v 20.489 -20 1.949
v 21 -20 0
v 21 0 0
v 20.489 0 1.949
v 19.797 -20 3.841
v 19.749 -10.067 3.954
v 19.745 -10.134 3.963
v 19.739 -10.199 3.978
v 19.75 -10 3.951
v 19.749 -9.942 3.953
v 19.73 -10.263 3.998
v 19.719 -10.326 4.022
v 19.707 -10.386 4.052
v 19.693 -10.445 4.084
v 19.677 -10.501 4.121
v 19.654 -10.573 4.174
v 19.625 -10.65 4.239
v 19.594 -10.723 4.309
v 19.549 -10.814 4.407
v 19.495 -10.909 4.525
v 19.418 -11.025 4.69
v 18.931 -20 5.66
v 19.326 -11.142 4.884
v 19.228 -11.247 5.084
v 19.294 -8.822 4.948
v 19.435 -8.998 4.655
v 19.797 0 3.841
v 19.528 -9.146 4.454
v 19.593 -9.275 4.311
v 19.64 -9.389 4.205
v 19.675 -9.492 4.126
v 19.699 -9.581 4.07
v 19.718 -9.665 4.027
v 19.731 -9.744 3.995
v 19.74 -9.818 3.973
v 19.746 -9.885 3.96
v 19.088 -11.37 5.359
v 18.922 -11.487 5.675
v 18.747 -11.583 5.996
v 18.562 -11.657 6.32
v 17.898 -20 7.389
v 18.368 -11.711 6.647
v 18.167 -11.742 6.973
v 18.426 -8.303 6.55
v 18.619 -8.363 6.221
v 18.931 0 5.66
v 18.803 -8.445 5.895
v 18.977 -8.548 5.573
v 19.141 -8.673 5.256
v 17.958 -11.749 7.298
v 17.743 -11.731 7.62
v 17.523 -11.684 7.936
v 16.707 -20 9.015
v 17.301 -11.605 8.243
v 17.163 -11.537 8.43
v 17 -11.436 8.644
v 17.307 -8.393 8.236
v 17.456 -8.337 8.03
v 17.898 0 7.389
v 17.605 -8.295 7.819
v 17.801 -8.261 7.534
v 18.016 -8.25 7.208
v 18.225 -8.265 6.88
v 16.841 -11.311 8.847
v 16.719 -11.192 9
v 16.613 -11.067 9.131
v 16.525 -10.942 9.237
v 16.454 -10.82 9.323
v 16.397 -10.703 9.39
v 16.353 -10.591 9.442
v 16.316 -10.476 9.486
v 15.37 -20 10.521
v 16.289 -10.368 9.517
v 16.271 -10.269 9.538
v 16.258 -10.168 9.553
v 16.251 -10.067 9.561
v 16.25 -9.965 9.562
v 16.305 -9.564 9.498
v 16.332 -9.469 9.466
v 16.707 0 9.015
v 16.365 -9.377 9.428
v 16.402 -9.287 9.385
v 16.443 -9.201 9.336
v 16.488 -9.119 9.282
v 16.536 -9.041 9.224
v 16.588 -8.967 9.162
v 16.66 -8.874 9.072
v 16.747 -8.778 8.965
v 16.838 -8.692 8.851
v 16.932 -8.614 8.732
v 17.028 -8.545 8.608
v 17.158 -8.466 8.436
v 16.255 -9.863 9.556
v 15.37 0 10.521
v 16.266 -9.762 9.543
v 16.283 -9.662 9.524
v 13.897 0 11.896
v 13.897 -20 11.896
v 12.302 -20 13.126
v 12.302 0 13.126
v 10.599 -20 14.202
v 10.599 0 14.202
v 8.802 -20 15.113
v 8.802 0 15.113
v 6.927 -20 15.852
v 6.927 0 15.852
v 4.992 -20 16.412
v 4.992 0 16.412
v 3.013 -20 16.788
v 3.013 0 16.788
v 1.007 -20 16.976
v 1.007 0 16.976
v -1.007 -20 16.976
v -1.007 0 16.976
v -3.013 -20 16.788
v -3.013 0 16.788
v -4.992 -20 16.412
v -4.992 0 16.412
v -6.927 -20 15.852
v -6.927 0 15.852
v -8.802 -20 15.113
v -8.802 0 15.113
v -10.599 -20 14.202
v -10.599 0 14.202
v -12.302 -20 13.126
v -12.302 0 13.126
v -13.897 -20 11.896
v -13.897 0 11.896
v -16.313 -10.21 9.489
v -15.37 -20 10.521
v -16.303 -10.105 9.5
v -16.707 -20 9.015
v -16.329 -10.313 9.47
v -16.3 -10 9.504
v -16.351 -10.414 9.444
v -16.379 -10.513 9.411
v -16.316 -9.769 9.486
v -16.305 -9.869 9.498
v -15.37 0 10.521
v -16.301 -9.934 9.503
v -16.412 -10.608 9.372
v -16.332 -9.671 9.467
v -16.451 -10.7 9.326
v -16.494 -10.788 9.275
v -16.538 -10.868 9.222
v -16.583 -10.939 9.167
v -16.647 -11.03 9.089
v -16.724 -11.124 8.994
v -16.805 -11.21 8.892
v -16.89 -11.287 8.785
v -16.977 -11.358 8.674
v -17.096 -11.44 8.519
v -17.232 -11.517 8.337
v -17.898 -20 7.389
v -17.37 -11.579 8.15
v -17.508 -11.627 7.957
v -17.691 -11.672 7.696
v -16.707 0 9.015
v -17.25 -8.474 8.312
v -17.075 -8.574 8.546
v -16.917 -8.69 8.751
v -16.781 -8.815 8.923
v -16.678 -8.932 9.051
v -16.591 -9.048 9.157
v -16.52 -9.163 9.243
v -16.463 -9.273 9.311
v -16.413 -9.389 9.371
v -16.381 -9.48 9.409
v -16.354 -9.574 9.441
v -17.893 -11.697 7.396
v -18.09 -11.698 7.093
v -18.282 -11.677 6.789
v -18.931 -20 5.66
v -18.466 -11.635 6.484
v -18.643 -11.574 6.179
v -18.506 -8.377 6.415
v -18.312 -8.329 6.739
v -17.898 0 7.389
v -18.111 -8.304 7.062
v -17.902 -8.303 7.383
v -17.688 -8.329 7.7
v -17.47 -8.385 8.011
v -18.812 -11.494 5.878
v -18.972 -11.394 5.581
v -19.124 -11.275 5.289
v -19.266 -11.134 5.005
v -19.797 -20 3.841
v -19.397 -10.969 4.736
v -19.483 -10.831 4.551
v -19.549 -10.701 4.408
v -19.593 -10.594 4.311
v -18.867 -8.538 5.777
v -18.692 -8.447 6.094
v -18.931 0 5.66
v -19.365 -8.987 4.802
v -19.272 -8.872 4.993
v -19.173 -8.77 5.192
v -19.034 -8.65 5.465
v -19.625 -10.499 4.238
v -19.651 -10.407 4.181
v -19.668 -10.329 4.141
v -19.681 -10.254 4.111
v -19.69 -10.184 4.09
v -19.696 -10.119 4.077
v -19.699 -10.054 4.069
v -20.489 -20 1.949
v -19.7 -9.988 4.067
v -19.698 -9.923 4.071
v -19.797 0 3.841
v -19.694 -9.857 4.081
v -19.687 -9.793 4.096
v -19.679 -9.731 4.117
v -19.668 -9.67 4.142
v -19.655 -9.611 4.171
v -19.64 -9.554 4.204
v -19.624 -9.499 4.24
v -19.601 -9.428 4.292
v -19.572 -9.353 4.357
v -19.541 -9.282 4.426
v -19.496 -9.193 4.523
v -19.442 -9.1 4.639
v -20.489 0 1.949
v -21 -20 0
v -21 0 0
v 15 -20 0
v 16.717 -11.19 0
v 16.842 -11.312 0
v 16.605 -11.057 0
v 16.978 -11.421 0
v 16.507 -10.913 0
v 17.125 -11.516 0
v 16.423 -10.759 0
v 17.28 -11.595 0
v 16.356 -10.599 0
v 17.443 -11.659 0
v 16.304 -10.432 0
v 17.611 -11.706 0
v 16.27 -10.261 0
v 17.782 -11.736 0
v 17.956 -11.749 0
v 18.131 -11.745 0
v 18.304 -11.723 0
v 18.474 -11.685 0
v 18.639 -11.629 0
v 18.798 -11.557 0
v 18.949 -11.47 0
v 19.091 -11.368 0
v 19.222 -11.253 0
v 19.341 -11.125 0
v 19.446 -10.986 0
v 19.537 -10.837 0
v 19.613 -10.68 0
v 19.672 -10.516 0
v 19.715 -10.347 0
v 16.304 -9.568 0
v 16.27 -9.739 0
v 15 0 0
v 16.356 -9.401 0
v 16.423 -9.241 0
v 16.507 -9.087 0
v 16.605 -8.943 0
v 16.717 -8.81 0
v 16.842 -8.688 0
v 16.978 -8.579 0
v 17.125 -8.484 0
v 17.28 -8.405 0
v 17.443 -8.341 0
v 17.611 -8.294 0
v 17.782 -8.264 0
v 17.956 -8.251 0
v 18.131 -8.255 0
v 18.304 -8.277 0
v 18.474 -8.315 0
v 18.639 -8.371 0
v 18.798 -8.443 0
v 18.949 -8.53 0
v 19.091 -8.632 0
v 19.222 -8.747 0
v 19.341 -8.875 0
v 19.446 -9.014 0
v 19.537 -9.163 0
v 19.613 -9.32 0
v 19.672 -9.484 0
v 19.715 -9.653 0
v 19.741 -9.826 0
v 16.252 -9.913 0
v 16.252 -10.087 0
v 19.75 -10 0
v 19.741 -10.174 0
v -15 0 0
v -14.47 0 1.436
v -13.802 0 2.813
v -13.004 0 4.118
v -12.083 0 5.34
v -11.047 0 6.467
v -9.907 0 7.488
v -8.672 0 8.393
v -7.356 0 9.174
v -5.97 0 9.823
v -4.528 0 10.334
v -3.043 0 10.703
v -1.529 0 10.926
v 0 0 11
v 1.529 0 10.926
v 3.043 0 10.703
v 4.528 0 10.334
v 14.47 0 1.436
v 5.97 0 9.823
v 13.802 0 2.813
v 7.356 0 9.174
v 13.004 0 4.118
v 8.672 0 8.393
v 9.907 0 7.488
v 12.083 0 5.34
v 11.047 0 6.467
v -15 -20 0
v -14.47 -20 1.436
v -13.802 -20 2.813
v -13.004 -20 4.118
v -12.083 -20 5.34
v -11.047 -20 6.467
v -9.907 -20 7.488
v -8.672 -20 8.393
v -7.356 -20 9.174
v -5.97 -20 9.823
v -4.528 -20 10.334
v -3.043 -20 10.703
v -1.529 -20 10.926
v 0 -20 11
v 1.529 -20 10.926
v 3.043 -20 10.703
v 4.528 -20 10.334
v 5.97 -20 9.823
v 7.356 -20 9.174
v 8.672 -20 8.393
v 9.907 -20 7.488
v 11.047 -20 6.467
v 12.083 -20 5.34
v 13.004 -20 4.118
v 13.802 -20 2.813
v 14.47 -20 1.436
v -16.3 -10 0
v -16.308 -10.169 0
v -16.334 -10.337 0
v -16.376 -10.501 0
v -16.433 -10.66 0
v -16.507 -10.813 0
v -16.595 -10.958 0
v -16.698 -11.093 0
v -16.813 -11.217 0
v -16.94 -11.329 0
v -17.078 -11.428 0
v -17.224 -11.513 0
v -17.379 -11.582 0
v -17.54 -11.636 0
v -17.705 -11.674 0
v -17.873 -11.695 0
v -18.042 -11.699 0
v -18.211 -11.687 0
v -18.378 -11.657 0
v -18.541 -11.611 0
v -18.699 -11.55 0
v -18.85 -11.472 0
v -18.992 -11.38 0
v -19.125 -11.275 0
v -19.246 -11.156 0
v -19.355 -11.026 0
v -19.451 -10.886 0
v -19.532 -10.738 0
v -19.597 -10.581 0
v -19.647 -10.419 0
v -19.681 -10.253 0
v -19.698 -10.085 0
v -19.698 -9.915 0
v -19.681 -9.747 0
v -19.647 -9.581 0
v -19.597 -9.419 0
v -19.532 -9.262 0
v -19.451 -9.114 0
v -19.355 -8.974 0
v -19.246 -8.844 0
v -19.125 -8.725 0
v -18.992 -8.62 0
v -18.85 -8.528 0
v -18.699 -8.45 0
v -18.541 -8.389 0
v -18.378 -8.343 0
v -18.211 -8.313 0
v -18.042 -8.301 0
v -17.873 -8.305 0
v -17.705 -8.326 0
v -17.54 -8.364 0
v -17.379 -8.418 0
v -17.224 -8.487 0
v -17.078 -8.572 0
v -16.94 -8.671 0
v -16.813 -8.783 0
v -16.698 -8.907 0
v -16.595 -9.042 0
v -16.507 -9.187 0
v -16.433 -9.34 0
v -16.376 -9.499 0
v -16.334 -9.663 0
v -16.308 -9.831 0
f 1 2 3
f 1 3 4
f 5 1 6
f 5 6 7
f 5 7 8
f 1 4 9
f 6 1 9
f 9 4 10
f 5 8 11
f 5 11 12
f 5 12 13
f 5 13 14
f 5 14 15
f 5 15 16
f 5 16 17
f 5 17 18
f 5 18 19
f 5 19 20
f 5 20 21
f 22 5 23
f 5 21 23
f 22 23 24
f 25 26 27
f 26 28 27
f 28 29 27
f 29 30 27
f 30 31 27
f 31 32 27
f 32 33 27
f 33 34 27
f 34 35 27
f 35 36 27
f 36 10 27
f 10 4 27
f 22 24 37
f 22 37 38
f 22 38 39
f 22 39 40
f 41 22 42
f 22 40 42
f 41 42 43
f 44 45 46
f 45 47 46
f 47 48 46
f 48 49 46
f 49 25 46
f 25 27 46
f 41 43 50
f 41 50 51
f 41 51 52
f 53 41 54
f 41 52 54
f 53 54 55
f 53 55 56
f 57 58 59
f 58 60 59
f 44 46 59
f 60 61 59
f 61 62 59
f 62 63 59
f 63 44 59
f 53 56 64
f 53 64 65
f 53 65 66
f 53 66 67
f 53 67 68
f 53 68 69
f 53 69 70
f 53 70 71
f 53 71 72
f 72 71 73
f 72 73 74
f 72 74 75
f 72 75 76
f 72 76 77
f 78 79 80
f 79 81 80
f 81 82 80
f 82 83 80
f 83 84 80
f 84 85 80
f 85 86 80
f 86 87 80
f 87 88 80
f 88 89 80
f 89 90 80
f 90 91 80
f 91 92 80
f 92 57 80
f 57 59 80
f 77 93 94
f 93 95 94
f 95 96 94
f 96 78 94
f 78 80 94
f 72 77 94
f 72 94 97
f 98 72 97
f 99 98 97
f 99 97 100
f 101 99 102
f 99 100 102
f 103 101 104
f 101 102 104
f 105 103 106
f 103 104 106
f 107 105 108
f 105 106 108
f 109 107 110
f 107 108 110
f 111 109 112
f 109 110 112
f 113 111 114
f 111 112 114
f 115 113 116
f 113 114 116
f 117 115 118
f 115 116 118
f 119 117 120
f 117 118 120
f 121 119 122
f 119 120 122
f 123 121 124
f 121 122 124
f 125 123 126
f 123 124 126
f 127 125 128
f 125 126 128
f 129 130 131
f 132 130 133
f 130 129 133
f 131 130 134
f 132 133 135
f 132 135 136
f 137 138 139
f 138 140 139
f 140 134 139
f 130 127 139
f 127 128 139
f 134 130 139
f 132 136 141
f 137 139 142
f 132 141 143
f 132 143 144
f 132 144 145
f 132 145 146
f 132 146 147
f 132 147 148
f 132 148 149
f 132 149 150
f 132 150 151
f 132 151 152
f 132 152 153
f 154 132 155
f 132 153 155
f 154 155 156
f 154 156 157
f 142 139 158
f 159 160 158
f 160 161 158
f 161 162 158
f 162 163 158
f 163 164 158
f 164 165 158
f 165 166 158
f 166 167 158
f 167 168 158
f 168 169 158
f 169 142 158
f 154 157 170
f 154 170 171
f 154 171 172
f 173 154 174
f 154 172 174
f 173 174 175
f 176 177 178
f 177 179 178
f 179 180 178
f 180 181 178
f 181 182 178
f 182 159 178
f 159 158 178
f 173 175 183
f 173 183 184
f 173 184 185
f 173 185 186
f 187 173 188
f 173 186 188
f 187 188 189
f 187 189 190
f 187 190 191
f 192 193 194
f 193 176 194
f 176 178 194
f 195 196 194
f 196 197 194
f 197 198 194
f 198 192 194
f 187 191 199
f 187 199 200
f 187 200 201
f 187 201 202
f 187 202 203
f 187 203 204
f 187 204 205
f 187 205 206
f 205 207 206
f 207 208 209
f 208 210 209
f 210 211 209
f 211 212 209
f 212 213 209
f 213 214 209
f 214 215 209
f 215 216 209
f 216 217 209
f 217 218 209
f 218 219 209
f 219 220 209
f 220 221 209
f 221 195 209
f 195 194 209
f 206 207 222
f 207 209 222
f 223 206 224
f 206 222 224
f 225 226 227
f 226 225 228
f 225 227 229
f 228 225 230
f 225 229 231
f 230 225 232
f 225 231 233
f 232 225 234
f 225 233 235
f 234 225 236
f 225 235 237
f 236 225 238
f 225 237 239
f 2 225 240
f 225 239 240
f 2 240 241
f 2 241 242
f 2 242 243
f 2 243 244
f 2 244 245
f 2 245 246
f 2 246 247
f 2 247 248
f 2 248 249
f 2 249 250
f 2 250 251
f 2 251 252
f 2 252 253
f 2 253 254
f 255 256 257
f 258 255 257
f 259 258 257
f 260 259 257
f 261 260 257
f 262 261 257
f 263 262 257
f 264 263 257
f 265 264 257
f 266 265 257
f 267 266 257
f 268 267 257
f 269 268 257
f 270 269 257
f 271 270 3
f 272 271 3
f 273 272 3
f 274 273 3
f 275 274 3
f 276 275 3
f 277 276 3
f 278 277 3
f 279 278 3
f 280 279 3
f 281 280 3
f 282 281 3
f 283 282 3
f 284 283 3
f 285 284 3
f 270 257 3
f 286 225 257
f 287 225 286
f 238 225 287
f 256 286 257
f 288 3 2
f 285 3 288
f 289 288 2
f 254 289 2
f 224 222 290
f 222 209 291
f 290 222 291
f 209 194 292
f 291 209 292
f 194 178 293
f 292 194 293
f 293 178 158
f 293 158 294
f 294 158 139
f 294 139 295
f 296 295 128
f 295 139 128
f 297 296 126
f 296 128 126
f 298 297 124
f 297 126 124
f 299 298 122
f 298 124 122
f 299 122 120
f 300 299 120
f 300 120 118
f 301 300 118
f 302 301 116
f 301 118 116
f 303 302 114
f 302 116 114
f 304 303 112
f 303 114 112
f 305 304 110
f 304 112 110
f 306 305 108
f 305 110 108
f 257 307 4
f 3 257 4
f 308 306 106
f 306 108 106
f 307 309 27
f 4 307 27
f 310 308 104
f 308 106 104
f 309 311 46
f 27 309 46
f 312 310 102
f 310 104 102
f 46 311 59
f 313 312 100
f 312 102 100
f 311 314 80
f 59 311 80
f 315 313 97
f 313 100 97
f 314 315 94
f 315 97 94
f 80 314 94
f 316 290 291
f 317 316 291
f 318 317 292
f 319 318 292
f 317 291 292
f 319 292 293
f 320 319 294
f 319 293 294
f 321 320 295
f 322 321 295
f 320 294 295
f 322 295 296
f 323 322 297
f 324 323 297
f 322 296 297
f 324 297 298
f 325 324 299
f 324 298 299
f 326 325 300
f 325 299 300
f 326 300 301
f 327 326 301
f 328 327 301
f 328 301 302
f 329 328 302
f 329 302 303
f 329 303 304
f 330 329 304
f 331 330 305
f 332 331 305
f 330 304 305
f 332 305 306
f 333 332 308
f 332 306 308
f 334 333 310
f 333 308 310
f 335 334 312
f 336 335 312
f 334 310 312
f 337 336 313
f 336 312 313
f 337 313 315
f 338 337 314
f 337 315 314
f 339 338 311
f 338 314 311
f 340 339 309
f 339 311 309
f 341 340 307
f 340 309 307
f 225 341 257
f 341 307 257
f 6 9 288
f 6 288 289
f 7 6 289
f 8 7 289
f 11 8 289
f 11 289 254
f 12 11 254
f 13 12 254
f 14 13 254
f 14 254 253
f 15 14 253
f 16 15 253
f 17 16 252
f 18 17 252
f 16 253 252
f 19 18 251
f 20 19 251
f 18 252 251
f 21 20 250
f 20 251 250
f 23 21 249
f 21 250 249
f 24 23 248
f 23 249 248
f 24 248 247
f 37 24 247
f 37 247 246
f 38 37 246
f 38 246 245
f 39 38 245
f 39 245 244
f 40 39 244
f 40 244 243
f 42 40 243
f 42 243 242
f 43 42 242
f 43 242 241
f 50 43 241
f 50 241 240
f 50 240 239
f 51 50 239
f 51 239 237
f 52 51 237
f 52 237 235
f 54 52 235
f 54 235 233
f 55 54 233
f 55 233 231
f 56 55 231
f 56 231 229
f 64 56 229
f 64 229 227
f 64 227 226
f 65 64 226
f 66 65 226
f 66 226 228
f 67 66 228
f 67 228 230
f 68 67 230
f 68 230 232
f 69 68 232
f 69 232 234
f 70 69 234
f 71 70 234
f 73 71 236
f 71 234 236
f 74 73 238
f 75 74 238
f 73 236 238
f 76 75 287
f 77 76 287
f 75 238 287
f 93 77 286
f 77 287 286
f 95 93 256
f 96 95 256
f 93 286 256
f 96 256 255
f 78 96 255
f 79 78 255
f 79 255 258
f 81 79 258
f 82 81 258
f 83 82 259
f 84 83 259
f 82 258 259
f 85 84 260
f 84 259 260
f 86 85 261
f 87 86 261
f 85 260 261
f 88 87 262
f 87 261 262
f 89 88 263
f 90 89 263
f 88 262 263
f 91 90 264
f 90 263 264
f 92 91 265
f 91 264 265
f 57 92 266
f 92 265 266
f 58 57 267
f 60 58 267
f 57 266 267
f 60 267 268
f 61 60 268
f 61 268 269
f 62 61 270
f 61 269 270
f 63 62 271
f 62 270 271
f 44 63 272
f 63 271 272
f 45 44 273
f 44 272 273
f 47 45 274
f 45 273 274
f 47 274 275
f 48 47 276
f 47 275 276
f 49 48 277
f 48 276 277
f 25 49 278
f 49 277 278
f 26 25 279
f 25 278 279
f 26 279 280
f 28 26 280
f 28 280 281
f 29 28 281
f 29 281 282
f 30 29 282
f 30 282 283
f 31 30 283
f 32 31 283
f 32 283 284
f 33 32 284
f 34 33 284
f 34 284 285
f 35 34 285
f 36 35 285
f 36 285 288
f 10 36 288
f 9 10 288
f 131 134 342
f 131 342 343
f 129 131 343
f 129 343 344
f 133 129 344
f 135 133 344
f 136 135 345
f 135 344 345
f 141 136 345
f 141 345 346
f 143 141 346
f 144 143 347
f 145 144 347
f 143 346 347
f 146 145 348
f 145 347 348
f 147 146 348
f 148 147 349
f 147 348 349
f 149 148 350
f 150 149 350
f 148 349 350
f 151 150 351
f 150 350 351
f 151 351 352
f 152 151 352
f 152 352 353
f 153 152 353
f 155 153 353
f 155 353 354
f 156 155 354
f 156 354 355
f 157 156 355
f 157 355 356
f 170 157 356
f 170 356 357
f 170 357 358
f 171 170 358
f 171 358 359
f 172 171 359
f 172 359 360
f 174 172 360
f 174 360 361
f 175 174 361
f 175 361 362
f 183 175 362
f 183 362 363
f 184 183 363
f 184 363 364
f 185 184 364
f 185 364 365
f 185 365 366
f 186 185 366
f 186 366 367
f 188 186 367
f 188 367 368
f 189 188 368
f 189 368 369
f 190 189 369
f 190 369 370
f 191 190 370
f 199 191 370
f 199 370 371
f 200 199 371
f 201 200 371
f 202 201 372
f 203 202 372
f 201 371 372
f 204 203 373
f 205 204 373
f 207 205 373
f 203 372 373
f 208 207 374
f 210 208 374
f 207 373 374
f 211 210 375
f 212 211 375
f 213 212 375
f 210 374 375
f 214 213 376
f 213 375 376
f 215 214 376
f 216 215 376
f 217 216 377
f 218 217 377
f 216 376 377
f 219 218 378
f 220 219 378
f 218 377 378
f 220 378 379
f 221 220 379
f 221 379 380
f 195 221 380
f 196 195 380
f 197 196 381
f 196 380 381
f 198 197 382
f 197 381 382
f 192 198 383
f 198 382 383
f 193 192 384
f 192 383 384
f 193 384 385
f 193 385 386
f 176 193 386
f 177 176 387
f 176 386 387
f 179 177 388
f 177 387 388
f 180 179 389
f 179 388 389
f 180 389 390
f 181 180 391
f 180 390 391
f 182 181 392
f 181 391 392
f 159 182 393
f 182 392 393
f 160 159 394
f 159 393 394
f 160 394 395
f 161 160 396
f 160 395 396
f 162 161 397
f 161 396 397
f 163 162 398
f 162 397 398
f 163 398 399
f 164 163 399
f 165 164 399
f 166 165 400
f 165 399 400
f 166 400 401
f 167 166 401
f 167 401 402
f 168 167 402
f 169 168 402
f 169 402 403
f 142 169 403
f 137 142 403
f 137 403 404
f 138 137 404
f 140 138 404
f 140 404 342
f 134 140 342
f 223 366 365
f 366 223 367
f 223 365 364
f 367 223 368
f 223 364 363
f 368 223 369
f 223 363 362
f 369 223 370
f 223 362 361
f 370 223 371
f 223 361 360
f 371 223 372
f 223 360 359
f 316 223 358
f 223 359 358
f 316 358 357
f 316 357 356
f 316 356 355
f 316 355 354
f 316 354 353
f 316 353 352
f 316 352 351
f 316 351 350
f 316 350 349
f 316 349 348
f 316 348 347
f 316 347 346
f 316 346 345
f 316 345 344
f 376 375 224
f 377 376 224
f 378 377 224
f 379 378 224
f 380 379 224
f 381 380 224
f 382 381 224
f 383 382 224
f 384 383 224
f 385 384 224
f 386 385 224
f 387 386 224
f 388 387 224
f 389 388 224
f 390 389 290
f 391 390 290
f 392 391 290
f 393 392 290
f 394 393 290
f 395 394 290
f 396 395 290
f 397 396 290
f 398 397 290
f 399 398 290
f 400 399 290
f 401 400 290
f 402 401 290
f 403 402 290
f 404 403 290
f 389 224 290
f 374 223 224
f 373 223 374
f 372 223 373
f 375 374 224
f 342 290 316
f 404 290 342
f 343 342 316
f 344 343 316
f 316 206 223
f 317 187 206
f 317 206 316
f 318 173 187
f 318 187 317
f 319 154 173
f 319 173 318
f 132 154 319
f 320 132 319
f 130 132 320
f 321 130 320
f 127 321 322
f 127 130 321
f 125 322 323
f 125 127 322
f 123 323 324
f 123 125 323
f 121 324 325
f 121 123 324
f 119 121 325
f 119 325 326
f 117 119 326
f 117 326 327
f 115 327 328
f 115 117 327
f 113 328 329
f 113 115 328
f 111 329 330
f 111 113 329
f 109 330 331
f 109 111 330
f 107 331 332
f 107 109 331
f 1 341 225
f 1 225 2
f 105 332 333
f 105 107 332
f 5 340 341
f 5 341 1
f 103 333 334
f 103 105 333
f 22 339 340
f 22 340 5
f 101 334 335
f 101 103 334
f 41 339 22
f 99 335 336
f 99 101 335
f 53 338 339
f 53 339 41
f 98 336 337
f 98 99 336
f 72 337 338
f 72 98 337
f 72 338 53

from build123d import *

# Parameters (mm, degrees)
F1_DEPTH = 20
F2_R     = 1.7
F3_R     = 1.75
F4_DEPTH = 17.001


with BuildPart() as f1:
    # F0 (on Front) → F1 (new body)
    with BuildSketch(Plane.XZ):
        with BuildLine():
            ThreePointArc((-15, 0), (0, 11), (15, 0))
            Line((15, 0), (21, 0))
            ThreePointArc((21, 0), (0, 17), (-21, 0))
            Line((-21, 0), (-15, 0))
        make_face()
    extrude(amount=F1_DEPTH)

    # F2 (on face) + F3 (on face) → F4 (cut, through all)
    with BuildSketch(Plane(origin=(0, 0, 0), x_dir=(1, 0, 0), z_dir=(0, 0, -1))):
        with Locations((-18, 10)):
            Circle(F2_R)
    with BuildSketch(Plane(origin=(0, 0, 0), x_dir=(1, 0, 0), z_dir=(0, 0, -1))):
        with Locations((18, 10)):
            Circle(F3_R)
    extrude(amount=-F4_DEPTH, mode=Mode.SUBTRACT)


solid = f1.part
